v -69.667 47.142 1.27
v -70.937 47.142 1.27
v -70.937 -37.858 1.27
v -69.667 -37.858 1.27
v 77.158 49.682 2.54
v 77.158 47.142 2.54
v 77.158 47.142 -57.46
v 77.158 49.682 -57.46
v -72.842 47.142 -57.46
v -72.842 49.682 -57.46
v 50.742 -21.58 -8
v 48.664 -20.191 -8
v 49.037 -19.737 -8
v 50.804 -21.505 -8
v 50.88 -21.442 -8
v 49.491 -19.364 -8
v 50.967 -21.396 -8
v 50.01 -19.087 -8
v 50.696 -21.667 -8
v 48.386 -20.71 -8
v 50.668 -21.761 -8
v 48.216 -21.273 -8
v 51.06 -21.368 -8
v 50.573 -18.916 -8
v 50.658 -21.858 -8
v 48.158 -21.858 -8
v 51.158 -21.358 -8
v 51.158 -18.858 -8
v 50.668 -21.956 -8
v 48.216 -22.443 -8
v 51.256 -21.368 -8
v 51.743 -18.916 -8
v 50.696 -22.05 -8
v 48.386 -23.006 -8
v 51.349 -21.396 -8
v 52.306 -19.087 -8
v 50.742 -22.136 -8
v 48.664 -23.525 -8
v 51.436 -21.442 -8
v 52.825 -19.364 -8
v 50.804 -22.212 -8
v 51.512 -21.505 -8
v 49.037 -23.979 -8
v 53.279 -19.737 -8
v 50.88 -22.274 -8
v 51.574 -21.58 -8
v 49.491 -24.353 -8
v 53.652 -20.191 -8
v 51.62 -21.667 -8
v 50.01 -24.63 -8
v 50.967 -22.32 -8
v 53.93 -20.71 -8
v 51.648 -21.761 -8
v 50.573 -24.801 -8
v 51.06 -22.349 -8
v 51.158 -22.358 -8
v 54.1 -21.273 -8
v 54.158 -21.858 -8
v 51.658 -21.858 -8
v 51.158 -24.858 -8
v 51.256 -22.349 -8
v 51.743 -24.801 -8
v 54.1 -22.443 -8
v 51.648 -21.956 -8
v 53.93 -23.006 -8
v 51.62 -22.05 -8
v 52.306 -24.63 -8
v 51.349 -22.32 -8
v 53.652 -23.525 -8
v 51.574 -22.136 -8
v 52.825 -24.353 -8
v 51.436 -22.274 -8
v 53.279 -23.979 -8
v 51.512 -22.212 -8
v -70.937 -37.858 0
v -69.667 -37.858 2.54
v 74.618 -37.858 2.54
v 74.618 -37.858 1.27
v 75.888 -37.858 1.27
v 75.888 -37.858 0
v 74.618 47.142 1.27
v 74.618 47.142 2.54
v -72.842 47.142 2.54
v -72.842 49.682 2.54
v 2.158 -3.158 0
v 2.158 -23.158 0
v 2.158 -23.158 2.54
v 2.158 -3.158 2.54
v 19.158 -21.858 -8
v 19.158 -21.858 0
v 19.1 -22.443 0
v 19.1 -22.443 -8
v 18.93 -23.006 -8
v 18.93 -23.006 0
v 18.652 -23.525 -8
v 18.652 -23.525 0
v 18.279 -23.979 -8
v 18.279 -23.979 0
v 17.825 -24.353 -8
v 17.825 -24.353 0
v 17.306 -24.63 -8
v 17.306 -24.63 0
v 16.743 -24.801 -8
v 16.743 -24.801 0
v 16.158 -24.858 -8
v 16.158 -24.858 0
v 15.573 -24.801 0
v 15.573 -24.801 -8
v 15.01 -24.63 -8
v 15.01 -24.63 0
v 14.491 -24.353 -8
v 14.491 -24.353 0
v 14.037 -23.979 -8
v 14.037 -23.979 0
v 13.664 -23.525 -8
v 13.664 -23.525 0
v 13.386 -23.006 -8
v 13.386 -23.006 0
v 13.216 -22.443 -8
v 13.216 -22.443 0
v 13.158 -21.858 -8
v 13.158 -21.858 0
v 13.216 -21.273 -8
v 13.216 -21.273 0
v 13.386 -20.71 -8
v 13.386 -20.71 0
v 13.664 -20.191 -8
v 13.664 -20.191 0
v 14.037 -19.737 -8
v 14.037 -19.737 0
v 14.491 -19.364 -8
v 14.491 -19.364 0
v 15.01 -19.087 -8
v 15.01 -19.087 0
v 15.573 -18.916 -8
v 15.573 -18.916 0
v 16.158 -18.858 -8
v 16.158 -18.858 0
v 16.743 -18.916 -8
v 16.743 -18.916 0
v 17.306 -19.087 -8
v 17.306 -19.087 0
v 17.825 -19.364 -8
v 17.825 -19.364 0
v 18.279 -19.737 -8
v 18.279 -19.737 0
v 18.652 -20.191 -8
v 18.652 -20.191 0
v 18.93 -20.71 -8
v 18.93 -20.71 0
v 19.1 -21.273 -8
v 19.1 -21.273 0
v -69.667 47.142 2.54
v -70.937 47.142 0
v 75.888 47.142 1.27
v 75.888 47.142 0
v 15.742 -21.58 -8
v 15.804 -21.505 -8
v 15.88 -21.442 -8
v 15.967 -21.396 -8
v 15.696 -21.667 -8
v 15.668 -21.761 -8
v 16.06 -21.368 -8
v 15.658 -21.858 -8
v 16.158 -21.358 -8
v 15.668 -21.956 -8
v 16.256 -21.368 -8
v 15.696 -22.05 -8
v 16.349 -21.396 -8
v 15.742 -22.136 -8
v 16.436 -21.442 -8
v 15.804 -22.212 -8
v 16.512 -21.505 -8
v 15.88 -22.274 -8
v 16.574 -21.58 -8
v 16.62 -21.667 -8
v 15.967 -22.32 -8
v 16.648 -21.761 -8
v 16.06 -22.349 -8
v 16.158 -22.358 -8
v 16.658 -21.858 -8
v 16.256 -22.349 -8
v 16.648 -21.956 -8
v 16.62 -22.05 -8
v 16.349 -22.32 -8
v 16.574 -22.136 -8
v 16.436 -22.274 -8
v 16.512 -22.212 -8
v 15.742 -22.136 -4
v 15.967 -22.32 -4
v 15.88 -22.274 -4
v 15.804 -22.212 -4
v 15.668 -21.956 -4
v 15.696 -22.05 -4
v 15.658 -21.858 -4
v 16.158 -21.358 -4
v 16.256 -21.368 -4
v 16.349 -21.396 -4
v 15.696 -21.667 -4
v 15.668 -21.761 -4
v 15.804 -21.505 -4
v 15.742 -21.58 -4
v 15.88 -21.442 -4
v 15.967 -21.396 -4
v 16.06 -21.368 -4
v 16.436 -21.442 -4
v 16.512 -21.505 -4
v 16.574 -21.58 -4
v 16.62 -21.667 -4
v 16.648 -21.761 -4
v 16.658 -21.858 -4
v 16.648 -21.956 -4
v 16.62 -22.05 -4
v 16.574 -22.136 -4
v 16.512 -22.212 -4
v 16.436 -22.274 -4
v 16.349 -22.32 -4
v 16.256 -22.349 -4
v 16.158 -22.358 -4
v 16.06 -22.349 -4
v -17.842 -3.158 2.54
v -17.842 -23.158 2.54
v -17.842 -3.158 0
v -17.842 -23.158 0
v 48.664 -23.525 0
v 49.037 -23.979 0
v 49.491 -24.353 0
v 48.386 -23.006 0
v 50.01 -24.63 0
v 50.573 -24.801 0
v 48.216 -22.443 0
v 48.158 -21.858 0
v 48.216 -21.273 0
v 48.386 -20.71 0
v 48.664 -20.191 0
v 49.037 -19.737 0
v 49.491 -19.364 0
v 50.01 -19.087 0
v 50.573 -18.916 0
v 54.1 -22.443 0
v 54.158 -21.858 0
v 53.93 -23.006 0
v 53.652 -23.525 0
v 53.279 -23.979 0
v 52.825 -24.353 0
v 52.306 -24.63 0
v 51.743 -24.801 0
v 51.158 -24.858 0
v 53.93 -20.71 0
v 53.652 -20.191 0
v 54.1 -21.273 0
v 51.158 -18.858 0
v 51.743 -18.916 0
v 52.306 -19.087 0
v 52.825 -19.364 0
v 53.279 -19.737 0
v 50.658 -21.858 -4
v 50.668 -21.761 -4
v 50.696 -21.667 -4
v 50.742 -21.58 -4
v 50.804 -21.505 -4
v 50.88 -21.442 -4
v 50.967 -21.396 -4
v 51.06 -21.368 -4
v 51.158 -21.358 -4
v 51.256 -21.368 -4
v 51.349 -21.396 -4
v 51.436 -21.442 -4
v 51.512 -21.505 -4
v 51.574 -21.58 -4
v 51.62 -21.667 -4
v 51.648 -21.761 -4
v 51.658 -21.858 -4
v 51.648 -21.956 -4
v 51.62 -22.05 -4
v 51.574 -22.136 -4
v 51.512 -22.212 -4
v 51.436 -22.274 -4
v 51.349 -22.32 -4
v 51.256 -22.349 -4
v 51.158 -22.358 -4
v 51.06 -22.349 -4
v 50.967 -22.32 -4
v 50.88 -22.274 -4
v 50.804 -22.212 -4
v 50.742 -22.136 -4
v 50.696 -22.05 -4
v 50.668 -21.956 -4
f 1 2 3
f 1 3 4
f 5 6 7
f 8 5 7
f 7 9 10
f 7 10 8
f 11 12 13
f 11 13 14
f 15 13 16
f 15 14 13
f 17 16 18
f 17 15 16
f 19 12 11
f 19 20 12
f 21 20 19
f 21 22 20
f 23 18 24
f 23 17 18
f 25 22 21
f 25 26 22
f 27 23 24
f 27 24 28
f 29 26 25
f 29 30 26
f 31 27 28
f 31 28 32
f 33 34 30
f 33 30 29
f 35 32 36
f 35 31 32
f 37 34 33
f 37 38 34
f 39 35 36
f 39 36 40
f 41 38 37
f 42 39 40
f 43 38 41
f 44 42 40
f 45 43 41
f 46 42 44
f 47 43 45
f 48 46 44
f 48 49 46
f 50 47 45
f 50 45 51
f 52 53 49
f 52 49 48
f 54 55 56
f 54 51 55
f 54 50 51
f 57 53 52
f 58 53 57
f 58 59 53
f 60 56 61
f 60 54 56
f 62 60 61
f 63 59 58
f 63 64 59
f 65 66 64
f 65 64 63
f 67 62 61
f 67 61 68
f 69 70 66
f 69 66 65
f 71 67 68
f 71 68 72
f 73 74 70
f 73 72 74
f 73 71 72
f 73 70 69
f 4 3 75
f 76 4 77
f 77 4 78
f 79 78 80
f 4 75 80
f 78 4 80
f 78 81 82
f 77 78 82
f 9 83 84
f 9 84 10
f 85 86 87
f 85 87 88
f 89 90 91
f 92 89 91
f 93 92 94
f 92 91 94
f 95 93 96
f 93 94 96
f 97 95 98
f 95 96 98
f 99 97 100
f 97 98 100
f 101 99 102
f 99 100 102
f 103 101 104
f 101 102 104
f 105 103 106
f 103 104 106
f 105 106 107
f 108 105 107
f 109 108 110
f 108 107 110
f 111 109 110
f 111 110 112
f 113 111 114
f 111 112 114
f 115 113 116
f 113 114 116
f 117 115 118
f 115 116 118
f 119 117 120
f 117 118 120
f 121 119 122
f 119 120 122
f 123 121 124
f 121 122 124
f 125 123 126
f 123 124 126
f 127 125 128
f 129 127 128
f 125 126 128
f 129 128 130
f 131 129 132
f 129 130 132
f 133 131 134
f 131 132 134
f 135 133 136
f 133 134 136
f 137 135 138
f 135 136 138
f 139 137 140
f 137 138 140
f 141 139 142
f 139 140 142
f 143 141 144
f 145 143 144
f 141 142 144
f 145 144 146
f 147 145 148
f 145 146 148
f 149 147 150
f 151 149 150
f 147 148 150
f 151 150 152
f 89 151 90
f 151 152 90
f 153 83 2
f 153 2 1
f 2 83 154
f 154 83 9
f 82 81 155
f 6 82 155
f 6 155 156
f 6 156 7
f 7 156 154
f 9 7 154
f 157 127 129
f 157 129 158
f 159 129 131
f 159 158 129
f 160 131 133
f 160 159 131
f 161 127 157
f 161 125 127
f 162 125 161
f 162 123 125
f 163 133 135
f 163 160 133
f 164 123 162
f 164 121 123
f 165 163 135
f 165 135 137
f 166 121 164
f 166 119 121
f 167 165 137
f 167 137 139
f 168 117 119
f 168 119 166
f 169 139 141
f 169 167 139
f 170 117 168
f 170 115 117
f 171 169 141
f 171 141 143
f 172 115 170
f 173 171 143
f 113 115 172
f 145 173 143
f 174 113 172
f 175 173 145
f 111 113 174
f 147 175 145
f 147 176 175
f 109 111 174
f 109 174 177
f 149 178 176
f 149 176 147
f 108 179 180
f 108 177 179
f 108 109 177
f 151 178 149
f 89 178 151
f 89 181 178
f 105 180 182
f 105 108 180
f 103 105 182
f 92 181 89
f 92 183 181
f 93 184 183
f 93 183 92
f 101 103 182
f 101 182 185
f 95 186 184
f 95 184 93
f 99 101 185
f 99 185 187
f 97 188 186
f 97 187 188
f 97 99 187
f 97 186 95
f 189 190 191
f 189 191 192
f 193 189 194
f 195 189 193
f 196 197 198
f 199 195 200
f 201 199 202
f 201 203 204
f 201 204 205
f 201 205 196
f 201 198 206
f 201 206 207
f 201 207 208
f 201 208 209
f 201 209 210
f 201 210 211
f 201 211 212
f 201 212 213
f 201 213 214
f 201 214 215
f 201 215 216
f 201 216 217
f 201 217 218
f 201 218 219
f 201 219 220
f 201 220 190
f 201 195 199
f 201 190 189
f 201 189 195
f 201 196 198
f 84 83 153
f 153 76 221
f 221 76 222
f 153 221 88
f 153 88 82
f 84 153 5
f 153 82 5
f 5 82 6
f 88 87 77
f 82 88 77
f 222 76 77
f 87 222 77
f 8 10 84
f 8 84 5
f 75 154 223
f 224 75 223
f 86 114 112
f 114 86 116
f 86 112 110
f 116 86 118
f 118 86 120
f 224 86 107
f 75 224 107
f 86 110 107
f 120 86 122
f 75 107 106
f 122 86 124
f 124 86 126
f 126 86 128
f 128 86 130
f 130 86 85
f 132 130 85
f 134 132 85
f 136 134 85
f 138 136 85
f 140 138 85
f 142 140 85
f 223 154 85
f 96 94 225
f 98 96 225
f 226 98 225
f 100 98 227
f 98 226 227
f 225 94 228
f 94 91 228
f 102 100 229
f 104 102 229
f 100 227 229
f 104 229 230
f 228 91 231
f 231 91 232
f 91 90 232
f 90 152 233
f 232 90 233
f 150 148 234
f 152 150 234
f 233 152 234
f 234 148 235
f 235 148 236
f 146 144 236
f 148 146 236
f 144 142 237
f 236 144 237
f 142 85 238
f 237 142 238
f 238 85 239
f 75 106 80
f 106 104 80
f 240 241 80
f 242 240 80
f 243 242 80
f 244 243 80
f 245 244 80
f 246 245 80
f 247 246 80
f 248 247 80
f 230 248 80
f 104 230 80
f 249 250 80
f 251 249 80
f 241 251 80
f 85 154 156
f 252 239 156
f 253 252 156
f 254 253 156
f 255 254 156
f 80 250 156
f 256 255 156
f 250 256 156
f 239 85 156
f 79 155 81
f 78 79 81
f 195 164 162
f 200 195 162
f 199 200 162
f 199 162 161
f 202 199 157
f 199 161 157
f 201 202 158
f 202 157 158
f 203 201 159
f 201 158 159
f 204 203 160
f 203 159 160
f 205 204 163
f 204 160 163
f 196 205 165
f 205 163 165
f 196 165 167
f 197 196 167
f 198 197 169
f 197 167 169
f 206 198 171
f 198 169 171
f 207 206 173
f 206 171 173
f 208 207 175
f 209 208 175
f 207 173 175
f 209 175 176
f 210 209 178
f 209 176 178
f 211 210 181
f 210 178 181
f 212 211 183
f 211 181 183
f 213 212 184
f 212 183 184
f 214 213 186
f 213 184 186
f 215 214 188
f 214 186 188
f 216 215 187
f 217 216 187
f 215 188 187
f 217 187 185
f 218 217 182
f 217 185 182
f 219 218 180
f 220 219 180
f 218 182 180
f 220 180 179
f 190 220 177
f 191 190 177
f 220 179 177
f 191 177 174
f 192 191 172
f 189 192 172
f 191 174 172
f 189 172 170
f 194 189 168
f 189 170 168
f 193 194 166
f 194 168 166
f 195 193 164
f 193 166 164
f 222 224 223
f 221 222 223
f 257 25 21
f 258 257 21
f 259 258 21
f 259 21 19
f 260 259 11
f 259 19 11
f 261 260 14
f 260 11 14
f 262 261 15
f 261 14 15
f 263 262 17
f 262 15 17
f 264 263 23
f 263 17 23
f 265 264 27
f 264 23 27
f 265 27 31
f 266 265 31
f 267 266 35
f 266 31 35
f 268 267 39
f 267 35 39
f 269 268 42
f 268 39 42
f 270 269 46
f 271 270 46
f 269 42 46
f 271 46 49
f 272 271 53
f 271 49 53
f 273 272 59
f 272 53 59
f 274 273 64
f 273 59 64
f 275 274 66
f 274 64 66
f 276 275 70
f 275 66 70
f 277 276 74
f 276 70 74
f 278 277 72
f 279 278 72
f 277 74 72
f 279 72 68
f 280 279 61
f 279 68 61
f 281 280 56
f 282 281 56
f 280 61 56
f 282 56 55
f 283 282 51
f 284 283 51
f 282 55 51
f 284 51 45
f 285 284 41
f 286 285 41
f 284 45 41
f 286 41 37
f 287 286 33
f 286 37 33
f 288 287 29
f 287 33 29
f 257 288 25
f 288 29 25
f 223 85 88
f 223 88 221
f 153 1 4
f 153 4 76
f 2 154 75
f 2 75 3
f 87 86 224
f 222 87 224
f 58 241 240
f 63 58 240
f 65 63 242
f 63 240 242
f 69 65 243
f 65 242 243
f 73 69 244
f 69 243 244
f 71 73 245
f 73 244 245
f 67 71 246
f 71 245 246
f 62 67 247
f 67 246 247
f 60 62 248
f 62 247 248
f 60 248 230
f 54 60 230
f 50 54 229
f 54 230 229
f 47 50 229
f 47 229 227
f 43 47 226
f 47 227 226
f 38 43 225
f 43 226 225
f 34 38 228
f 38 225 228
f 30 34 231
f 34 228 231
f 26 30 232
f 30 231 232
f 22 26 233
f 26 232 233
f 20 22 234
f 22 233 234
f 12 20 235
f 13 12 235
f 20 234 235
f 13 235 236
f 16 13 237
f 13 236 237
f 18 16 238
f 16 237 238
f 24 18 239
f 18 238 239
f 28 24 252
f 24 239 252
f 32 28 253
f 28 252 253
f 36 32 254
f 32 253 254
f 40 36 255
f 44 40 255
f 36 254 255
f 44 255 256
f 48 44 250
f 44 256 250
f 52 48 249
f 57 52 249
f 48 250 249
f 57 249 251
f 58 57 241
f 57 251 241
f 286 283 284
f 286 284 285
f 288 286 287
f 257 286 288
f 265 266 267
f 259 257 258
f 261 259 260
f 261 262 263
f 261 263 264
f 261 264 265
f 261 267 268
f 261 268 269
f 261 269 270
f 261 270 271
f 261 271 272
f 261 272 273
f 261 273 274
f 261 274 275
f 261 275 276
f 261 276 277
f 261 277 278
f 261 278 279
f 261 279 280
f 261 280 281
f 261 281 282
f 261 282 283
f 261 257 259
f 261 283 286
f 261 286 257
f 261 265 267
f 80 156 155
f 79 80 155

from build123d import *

# Parameters (mm, degrees)
SKETCH1_W           = 150
SKETCH1_H           = 85
BOSS_EXTRUDE1_DEPTH = 2.54
SKETCH2_W           = 20
SKETCH2_H           = 20
CUT_EXTRUDE1_DEPTH  = 2.54
SKETCH3_R           = 3
BOSS_EXTRUDE2_DEPTH = 8
SKETCH9_R           = 0.5
CUT_EXTRUDE7_DEPTH  = 4
CUT_EXTRUDE8_DEPTH  = 85
SKETCH11_W          = 150
SKETCH11_H          = 60
BOSS_EXTRUDE3_DEPTH = 2.54


with BuildPart() as part:
    # Sketch1 → Boss-Extrude1 (new body)
    with BuildSketch(Plane.XY):
        with Locations((2.158007809, 4.641833841)):
            Rectangle(SKETCH1_W, SKETCH1_H)
    extrude(amount=BOSS_EXTRUDE1_DEPTH)

    # Sketch2 → Cut-Extrude1 (cut)
    with BuildSketch(Plane(origin=(0, 0, 0), x_dir=(-1, 0, 0), z_dir=(0, 0, -1))):
        with Locations((7.841992191, -13.158166159)):
            Rectangle(SKETCH2_W, SKETCH2_H)
    extrude(amount=-CUT_EXTRUDE1_DEPTH, mode=Mode.SUBTRACT)

    # Sketch3 → Boss-Extrude2 (add)
    with BuildSketch(Plane(origin=(0, 0, 0), x_dir=(-1, 0, 0), z_dir=(0, 0, -1))):
        with Locations(Location((-51.158007809, -21.858166159, 0), (0, 0, 180))):
            Circle(SKETCH3_R)
        with Locations(Location((-16.158007809, -21.858166159, 0), (0, 0, 180))):
            Circle(SKETCH3_R)
    extrude(amount=BOSS_EXTRUDE2_DEPTH)

    # Sketch9 → Cut-Extrude7 (cut)
    with BuildSketch(Plane(origin=(0, 0, -8), x_dir=(-1, 0, 0), z_dir=(0, 0, -1))):
        with Locations((-51.158007809, -21.858166159)):
            Circle(SKETCH9_R)
        with Locations((-16.158007809, -21.858166159)):
            Circle(SKETCH9_R)
    extrude(amount=-CUT_EXTRUDE7_DEPTH, mode=Mode.SUBTRACT)

    # Sketch10 → Cut-Extrude8 (cut)
    with BuildSketch(Plane(origin=(0, 47.141833841, 0), x_dir=(1, 0, 0), z_dir=(0, 1, 0))):
        Polygon((-69.666992191, -1.27), (-69.666992191, -2.54), (-72.841992191, -2.54), (-72.841992191, 0), (-70.936992191, 0), (-70.936992191, -1.27), align=None)
        Polygon((75.888007809, 0), (75.888007809, -1.27), (74.618007809, -1.27), (74.618007809, -2.54), (77.158007809, -2.54), (77.158007809, 0), align=None)
    extrude(amount=-CUT_EXTRUDE8_DEPTH, mode=Mode.SUBTRACT)

    # Sketch11 → Boss-Extrude3 (add)
    with BuildSketch(Plane(origin=(0, 47.141833841, 0), x_dir=(1, 0, 0), z_dir=(0, 1, 0))):
        with Locations((2.158007809, 27.46)):
            Rectangle(SKETCH11_W, SKETCH11_H)
    extrude(amount=BOSS_EXTRUDE3_DEPTH)


solid = part.part
